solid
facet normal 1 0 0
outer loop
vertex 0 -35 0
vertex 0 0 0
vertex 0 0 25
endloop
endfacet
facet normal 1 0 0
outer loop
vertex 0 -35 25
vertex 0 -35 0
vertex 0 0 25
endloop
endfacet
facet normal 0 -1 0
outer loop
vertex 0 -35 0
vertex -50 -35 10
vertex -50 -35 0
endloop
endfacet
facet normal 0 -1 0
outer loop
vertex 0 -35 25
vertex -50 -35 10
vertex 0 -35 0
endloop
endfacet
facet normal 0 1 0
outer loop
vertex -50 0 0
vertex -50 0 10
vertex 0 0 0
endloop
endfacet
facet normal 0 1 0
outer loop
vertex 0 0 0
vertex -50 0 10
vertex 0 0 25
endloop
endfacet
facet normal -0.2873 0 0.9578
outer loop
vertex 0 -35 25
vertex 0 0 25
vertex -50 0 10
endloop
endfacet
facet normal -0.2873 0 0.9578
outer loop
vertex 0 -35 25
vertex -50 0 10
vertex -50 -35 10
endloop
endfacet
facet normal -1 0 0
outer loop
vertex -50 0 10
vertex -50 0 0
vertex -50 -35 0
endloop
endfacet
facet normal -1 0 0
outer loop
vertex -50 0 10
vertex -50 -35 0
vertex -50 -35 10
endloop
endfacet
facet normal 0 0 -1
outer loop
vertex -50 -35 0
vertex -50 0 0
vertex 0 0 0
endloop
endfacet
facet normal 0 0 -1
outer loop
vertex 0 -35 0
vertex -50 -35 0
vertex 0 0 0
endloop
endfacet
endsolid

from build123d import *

# Parameters (mm, degrees)
F0_W     = 50
F0_H     = 25
F1_DEPTH = 35
F2_SIZE2 = 49.99999
F2_SIZE  = 14.99999


# Not quite as in the source:
# - a fillet or chamfer is up to 0.001 mm smaller than in the source, because OpenCascade refuses the exact size


with BuildPart() as f1:
    # F0 (on Front) → F1 (new body)
    with BuildSketch(Plane.XZ):
        with Locations((-25, 12.5)):
            Rectangle(F0_W, F0_H)
    extrude(amount=F1_DEPTH)

    # F2 (size 15 and 50 in the source; OpenCascade refuses exactly that, so slightly less here)
    f2_edges = [f1.edges().sort_by_distance(p)[0] for p in [
        (-50, -17.5, 25),
    ]]
    f2_side = f1.faces().sort_by_distance((-50, -17.5, 12.5))[0]
    chamfer(f2_edges, length=F2_SIZE, length2=F2_SIZE2, reference=f2_side)


solid = f1.part
